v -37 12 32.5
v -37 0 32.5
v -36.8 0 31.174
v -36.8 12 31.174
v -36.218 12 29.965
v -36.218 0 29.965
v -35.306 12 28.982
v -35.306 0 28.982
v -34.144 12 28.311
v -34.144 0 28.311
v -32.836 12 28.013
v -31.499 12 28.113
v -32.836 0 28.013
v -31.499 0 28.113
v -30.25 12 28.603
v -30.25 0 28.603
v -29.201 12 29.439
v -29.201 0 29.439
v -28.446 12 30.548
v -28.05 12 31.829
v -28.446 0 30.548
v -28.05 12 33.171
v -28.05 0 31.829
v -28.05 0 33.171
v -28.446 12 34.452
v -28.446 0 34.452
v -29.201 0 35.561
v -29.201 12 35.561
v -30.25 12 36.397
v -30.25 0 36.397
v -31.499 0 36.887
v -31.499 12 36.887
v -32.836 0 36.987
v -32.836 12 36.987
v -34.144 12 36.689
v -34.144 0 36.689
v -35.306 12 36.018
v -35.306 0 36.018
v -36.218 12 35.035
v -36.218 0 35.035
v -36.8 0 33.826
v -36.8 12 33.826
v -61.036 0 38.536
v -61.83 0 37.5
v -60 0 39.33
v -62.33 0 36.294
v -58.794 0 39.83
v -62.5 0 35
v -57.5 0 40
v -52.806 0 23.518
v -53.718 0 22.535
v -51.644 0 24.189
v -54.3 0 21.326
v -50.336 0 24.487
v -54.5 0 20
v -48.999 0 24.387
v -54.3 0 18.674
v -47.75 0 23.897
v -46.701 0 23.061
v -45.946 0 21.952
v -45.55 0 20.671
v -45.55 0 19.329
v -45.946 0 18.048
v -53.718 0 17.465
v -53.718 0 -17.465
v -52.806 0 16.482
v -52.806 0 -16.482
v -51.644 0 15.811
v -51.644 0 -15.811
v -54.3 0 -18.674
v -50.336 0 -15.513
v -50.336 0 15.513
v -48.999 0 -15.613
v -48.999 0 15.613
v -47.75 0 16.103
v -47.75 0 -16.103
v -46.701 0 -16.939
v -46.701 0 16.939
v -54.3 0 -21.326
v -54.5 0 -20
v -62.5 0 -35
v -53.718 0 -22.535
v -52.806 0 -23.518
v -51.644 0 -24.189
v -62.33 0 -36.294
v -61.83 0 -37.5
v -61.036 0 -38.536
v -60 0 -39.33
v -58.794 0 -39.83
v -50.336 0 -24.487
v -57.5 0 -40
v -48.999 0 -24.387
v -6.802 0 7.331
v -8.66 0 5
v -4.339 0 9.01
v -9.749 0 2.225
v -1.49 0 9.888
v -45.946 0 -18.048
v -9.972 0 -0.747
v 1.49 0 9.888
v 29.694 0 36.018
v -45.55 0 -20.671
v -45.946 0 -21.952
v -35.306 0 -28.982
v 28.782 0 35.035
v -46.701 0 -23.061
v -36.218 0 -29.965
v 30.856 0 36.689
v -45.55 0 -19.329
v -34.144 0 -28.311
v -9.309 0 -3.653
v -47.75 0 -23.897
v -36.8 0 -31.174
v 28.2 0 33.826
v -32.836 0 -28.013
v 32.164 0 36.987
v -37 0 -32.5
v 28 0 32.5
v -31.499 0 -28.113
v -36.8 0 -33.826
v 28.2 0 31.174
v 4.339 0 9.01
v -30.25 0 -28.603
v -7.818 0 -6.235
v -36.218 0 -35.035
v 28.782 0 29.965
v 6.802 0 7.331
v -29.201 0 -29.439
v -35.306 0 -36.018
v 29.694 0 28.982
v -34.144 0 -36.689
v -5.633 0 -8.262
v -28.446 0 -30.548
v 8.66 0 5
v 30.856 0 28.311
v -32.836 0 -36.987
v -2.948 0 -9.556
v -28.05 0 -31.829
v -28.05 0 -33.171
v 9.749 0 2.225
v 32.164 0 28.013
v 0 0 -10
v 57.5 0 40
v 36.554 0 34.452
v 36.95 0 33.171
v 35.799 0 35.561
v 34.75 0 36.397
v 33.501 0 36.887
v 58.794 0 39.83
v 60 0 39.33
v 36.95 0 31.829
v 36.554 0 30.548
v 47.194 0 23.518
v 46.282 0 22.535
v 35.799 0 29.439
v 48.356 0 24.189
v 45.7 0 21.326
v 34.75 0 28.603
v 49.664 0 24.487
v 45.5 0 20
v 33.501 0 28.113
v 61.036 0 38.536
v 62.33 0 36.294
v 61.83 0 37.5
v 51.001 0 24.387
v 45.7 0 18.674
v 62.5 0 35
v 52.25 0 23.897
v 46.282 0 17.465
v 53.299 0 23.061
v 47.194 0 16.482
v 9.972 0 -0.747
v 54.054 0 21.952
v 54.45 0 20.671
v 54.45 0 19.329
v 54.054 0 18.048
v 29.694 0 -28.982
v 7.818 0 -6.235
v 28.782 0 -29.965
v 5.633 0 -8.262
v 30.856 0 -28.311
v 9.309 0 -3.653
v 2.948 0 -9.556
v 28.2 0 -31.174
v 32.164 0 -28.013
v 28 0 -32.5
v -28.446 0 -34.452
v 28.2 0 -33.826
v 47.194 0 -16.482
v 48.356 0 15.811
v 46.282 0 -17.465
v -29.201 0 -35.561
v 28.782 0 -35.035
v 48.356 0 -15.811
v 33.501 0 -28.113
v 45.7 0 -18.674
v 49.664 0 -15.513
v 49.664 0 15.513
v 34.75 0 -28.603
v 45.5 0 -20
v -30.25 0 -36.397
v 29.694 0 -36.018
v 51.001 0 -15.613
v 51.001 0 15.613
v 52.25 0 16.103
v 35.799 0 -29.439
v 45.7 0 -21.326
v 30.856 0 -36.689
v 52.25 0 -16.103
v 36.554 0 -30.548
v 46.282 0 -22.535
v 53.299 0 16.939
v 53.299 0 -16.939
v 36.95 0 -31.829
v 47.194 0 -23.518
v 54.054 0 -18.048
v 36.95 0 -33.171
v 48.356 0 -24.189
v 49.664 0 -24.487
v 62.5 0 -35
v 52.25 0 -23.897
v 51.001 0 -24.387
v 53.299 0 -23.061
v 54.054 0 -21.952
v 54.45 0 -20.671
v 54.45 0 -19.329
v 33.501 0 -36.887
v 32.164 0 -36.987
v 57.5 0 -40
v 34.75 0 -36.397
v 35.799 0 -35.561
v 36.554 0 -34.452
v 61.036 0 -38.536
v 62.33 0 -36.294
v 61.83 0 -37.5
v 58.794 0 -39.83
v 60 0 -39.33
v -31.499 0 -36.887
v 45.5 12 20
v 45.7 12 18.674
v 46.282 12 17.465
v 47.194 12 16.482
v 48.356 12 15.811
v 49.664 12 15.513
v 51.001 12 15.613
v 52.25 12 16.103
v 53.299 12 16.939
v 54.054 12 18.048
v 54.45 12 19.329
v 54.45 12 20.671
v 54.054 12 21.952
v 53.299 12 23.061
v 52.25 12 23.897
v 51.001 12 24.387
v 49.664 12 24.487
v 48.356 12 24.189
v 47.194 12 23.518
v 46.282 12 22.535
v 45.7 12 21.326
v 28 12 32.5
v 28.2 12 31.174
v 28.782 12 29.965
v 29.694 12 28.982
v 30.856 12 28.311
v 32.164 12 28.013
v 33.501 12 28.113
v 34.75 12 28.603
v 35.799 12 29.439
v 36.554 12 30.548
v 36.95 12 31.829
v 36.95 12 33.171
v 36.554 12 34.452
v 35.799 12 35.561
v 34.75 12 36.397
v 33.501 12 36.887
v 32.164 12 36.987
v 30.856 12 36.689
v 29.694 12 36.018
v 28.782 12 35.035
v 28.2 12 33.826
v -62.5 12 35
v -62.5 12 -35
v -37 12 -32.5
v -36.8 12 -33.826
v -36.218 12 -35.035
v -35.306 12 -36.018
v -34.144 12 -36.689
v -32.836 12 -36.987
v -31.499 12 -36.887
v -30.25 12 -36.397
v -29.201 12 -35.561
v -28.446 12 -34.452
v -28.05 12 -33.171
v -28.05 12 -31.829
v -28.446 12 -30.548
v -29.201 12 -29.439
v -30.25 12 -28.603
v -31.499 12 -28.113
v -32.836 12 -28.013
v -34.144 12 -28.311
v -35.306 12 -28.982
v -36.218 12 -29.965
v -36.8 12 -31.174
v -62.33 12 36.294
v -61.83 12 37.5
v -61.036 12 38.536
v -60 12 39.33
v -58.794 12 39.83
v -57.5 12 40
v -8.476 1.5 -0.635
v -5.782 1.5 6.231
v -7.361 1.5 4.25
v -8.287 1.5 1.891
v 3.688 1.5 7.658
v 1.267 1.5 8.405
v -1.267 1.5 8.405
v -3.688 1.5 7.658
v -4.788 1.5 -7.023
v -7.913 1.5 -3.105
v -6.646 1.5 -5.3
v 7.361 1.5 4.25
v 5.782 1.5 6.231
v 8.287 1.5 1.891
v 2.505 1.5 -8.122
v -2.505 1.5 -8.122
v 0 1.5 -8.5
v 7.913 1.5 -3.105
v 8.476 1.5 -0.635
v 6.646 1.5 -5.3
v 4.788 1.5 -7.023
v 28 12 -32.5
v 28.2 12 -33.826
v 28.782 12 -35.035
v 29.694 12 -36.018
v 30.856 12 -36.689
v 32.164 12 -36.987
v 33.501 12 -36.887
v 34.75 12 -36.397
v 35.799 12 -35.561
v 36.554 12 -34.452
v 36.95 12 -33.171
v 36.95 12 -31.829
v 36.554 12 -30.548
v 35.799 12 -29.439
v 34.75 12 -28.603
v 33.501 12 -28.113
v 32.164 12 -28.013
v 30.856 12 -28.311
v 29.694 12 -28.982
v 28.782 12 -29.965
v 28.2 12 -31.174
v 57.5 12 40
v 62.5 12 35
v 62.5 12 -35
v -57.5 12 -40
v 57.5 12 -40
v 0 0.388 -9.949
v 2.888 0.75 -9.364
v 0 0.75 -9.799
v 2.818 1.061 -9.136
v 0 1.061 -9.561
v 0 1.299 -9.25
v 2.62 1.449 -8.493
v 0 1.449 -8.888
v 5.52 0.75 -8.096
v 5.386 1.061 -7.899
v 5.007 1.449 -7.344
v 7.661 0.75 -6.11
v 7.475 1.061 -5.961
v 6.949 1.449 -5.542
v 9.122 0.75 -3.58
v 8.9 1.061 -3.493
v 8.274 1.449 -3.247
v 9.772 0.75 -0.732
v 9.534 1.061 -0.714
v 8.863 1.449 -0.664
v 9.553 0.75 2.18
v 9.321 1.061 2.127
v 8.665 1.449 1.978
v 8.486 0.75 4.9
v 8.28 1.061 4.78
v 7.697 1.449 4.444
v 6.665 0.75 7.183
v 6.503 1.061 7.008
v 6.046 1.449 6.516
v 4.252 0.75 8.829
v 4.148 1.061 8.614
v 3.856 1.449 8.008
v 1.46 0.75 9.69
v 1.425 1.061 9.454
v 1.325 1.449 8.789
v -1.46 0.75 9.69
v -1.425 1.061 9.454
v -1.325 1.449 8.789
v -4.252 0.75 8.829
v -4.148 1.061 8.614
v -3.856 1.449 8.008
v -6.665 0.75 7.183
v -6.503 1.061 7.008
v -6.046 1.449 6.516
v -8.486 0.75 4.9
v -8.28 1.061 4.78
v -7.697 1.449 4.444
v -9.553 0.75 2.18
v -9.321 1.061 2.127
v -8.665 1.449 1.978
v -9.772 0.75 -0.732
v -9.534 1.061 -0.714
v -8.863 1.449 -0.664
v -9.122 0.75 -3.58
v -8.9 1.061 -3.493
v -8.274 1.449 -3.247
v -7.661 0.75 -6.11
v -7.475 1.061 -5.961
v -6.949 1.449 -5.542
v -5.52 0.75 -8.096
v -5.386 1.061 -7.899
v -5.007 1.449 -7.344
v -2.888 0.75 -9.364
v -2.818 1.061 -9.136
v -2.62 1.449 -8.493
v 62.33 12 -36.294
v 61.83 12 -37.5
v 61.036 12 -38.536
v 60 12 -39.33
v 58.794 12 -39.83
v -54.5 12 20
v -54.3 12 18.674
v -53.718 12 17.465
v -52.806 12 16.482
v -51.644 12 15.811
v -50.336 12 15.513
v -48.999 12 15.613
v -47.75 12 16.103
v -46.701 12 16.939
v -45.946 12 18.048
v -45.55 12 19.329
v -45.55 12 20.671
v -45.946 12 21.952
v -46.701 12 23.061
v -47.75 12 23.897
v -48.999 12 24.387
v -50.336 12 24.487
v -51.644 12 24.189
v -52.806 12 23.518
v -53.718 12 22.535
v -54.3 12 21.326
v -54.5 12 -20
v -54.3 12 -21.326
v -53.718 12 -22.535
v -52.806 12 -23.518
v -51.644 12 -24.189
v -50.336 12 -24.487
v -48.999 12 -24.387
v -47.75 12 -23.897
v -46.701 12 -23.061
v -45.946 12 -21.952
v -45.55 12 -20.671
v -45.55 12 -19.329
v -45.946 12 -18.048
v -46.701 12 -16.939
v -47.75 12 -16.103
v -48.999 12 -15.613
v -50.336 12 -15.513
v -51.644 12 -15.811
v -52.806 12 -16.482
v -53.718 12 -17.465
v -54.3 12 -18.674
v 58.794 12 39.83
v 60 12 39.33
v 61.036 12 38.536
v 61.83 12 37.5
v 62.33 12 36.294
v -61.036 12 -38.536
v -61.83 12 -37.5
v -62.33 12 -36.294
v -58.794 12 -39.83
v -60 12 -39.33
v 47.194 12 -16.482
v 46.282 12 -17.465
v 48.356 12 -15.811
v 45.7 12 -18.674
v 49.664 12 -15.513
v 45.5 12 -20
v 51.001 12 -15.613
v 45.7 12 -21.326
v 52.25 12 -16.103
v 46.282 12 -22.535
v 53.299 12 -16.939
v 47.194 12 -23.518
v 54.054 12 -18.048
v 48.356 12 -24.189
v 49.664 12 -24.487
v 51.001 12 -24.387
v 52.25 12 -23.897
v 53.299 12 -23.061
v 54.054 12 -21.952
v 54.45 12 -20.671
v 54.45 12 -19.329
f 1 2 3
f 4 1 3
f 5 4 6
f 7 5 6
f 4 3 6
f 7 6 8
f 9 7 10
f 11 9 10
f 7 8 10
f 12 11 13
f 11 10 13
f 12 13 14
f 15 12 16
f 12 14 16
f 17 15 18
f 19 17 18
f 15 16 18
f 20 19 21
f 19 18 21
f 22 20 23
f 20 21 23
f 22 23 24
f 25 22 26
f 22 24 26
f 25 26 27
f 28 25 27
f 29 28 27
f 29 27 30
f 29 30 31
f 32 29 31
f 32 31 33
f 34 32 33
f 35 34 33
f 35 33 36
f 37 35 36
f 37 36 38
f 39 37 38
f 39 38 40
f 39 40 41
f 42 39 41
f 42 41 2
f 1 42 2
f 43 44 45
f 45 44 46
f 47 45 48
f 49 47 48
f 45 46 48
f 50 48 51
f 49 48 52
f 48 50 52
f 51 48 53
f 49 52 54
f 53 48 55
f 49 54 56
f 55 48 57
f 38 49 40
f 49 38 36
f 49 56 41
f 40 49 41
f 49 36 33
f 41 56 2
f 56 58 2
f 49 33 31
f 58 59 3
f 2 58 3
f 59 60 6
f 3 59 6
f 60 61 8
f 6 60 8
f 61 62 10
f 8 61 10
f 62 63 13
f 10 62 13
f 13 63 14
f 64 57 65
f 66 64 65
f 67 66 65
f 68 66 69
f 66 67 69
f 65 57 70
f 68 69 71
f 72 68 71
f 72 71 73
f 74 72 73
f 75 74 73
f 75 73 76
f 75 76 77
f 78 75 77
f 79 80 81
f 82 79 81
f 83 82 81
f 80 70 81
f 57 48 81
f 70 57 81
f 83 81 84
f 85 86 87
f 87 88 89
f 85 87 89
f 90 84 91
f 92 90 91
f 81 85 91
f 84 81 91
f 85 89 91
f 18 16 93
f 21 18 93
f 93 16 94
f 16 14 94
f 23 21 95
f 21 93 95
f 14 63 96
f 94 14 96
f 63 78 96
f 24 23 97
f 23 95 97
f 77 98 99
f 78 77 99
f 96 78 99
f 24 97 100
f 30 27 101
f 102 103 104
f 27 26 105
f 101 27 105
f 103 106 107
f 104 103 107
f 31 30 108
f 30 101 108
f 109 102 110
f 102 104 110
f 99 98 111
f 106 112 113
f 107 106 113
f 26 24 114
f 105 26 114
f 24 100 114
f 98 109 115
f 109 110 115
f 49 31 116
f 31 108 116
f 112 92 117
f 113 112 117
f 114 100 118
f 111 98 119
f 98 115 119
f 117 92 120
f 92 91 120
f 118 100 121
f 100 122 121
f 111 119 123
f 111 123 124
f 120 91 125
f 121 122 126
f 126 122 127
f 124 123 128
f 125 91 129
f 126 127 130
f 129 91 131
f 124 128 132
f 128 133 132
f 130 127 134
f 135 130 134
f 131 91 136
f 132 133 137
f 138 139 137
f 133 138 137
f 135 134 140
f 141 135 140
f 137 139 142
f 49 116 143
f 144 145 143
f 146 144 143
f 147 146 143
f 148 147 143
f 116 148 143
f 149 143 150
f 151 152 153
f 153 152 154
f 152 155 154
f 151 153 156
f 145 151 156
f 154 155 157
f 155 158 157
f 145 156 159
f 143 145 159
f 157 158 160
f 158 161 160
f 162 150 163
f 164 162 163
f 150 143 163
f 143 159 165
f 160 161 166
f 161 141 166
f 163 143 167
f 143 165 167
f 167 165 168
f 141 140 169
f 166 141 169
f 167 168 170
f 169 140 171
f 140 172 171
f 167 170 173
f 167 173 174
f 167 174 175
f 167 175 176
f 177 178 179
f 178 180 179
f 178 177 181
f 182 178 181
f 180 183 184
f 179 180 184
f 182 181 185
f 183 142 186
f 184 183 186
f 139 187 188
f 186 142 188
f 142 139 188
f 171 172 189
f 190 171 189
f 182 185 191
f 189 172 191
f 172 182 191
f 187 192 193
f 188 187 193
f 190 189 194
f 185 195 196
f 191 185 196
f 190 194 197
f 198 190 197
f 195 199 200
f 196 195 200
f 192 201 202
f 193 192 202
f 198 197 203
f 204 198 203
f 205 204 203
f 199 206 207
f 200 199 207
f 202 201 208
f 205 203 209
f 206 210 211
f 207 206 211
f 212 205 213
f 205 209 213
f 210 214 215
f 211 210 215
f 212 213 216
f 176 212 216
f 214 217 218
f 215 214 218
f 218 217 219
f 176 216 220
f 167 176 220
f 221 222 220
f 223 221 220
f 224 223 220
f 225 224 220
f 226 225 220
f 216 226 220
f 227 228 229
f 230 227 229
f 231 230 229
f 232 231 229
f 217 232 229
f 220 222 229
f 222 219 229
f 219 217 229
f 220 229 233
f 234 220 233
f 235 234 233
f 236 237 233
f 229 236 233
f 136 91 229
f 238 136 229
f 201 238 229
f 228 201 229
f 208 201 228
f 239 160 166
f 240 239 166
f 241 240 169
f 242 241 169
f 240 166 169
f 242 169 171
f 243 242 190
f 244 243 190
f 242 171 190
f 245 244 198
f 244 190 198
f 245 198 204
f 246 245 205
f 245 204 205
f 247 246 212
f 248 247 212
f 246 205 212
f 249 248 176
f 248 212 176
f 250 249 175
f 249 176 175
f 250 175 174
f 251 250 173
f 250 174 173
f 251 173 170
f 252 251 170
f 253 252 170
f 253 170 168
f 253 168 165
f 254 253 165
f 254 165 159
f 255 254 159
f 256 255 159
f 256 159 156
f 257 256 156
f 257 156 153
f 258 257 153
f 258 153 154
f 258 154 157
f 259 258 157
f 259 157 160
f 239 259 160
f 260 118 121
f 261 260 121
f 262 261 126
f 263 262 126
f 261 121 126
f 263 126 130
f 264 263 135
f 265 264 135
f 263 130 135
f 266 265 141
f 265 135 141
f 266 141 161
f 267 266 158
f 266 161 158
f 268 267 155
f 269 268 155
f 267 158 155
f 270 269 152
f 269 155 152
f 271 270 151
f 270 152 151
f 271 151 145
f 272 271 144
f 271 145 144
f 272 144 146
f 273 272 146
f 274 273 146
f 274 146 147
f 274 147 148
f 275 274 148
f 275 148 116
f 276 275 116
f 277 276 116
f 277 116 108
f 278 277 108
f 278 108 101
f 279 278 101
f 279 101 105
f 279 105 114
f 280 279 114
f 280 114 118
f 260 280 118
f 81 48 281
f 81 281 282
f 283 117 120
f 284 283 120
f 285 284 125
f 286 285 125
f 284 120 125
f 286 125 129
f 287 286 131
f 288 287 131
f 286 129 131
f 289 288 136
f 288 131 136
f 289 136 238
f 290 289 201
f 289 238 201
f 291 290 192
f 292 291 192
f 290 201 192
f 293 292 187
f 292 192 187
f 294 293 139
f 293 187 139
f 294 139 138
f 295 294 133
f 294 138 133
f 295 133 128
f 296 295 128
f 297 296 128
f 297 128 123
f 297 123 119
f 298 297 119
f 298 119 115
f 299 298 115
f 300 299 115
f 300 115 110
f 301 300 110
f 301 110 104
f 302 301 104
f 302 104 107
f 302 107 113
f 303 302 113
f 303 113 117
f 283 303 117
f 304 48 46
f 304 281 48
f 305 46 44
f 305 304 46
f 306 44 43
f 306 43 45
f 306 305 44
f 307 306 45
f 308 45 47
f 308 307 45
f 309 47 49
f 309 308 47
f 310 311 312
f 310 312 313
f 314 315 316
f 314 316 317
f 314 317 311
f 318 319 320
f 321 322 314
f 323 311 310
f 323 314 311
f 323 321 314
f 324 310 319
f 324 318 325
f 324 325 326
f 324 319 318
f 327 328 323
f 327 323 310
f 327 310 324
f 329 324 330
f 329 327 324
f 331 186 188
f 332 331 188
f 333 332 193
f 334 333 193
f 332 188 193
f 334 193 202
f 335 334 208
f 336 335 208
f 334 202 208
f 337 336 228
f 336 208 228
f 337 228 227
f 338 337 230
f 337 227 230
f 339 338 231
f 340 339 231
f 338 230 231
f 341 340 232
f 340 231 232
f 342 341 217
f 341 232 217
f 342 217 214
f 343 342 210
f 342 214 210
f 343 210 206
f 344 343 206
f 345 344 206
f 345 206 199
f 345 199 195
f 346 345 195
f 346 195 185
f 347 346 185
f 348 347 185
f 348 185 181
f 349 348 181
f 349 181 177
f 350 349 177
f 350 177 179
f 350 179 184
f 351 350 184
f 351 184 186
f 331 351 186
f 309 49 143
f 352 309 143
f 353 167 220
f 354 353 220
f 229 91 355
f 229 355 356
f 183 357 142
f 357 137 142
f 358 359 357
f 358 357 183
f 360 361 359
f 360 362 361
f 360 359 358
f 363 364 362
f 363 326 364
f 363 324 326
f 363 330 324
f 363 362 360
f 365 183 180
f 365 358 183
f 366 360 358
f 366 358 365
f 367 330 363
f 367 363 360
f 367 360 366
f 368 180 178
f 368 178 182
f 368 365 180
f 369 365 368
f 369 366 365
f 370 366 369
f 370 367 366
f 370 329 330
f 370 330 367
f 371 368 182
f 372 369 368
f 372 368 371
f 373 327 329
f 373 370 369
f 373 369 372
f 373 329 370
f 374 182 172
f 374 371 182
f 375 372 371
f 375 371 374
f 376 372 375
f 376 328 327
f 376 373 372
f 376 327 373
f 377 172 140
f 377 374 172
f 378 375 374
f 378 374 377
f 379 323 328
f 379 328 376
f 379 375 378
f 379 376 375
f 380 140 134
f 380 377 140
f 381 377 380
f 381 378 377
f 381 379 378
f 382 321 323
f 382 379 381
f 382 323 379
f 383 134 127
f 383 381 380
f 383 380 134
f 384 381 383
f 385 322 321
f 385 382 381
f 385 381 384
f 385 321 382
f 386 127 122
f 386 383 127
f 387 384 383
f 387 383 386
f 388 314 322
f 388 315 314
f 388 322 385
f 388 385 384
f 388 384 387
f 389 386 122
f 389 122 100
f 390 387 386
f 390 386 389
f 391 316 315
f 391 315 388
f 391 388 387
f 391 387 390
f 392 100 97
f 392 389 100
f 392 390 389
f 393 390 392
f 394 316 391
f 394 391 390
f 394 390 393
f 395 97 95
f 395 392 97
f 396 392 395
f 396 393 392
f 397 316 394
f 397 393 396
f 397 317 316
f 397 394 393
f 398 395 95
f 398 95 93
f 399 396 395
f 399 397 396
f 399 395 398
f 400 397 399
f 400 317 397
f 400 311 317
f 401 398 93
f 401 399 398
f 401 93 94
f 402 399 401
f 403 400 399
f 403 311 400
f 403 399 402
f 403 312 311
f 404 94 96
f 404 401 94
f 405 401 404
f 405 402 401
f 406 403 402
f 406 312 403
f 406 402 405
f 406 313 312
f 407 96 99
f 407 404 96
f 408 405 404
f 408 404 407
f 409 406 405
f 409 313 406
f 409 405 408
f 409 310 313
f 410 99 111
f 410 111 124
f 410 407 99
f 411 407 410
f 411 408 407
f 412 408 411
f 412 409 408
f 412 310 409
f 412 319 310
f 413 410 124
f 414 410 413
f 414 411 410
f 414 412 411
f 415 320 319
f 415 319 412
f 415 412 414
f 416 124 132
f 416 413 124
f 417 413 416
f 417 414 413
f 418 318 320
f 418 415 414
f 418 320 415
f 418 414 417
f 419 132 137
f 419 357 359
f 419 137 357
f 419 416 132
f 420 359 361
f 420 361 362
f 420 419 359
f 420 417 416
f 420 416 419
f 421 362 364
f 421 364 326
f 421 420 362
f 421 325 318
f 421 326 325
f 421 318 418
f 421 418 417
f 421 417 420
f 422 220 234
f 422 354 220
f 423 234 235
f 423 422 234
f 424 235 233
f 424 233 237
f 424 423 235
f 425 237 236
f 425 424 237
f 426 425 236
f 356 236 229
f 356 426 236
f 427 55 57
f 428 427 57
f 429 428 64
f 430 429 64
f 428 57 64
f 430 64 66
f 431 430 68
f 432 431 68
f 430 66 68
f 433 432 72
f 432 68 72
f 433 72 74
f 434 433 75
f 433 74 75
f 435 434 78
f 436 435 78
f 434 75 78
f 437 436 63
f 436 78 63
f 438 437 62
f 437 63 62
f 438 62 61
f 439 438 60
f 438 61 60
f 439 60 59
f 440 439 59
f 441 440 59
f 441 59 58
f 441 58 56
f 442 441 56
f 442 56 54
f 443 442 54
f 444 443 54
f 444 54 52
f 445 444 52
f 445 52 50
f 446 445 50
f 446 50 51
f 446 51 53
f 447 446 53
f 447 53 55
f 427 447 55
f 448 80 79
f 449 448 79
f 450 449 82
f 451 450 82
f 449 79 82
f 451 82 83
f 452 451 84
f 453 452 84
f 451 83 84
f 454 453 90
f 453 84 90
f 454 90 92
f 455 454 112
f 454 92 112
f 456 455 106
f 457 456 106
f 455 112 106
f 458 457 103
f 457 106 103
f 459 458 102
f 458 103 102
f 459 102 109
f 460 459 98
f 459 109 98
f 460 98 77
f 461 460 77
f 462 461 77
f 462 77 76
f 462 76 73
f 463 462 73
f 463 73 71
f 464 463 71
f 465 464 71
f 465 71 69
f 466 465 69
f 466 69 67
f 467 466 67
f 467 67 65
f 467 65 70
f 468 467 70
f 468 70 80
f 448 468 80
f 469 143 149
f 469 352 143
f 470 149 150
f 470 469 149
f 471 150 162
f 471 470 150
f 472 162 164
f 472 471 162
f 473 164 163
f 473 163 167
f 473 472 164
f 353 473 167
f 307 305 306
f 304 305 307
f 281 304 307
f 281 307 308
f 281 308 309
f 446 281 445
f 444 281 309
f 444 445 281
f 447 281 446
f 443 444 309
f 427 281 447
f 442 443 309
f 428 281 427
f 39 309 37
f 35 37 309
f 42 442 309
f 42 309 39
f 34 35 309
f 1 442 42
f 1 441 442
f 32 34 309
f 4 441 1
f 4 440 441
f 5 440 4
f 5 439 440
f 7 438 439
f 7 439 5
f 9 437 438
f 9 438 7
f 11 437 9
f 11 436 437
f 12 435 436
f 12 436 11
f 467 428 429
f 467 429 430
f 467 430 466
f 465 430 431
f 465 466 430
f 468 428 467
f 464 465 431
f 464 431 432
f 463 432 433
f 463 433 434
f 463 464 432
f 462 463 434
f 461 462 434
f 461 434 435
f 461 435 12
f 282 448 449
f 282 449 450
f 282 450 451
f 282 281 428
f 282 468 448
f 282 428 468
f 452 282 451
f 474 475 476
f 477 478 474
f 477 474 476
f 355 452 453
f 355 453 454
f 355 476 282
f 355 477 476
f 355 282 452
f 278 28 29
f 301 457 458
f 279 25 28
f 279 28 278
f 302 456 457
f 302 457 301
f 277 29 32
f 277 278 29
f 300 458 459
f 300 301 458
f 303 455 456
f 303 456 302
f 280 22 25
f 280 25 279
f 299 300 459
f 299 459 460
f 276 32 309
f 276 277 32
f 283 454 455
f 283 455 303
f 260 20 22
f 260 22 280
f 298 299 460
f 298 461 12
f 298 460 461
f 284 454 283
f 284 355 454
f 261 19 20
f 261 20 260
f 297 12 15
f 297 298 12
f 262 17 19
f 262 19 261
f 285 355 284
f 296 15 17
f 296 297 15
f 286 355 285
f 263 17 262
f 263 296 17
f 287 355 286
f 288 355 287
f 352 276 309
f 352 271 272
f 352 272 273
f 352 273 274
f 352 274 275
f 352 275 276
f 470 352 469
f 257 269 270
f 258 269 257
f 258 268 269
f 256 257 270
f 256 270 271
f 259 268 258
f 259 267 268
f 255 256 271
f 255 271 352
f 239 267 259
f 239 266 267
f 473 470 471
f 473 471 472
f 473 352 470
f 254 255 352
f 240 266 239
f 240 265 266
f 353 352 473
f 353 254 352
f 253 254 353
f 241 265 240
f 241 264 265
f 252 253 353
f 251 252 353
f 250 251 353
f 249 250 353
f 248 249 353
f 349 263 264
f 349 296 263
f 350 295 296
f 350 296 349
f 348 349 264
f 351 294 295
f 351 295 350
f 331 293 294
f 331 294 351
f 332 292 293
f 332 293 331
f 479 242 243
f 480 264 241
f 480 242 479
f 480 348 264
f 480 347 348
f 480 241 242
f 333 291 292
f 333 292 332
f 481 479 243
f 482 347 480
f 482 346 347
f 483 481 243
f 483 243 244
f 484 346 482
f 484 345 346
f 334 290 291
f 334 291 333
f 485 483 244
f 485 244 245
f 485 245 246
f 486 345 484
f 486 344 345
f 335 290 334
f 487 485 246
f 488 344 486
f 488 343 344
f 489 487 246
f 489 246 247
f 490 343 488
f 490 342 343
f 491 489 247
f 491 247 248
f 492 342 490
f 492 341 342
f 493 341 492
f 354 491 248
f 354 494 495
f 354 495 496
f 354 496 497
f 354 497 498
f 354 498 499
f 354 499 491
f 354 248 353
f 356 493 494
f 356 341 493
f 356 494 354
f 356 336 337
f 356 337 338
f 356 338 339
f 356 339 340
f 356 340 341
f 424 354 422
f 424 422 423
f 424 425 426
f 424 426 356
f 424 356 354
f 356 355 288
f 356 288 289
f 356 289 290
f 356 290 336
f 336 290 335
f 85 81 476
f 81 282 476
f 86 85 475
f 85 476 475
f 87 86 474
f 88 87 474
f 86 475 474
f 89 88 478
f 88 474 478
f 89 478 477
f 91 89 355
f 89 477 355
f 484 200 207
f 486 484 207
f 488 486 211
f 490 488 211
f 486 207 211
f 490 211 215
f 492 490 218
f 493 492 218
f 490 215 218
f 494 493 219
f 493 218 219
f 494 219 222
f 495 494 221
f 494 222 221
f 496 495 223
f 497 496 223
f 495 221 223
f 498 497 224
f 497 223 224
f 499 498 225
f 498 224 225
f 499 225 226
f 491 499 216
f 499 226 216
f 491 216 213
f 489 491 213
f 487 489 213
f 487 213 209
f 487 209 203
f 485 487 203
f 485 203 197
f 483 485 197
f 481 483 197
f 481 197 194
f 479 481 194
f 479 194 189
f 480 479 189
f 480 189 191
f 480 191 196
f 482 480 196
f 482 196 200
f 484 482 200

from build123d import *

# Parameters (mm, degrees)
SZKIC1_W                    = 125
SZKIC1_H                    = 80
DODANIE_WYCI_GNI_CIE1_DEPTH = 12
ZAOKR_GLENIE1_R             = 5
OTW_R_POD_RUB_M81_D         = 9
OTW_R_POD_RUB_M81_DEPTH     = 16
OTW_R_POD_RUB_M81_TIP       = 2.703872786
OTW_R_POD_RUB_M82_D         = 9
OTW_R_POD_RUB_M82_DEPTH     = 16
OTW_R_POD_RUB_M82_TIP       = 2.703872786
SZKIC8_R                    = 10
WYTNIJ_WYCI_GNI_CIE1_DEPTH  = 1.5
ZAOKR_GLENIE2_R             = 1.5


with BuildPart() as part:
    # Szkic1 → Dodanie-wyciągnięcie1 (new body)
    with BuildSketch(Plane(origin=(0, 0, 0), x_dir=(1, 0, 0), z_dir=(0, 1, 0))):
        Rectangle(SZKIC1_W, SZKIC1_H)
    extrude(amount=DODANIE_WYCI_GNI_CIE1_DEPTH)

    # Zaokrąglenie1
    zaokr_glenie1_edges = [part.edges().sort_by_distance(p)[0] for p in [
        (62.5, 6, 40),
        (-62.5, 6, 40),
        (-62.5, 6, -40),
        (62.5, 6, -40),
    ]]
    fillet(zaokr_glenie1_edges, radius=ZAOKR_GLENIE1_R)

    # Otwór pod śrubę M81
    with Locations(Plane(origin=(0, 12, 0), x_dir=(1, 0, 0), z_dir=(0, 1, 0))):
        with Locations((-50, 20), (50, 20), (50, -20), (-50, -20)):
            Hole(OTW_R_POD_RUB_M81_D / 2, depth=OTW_R_POD_RUB_M81_DEPTH)
            with Locations((0, 0, -(OTW_R_POD_RUB_M81_DEPTH + OTW_R_POD_RUB_M81_TIP / 2))):  # 118° drill point
                Cone(0, OTW_R_POD_RUB_M81_D / 2, OTW_R_POD_RUB_M81_TIP, mode=Mode.SUBTRACT)

    # Otwór pod śrubę M82
    with Locations(Plane(origin=(0, 12, 0), x_dir=(1, 0, 0), z_dir=(0, 1, 0))):
        with Locations((-32.5, 32.5), (32.5, 32.5), (32.5, -32.5), (-32.5, -32.5)):
            Hole(OTW_R_POD_RUB_M82_D / 2, depth=OTW_R_POD_RUB_M82_DEPTH)
            with Locations((0, 0, -(OTW_R_POD_RUB_M82_DEPTH + OTW_R_POD_RUB_M82_TIP / 2))):  # 118° drill point
                Cone(0, OTW_R_POD_RUB_M82_D / 2, OTW_R_POD_RUB_M82_TIP, mode=Mode.SUBTRACT)

    # Szkic8 → Wytnij-wyciągnięcie1 (cut)
    with BuildSketch(Plane.XZ):
        with Locations(Location((0, 0, 0), (0, 0, 270))):
            Circle(SZKIC8_R)
    extrude(amount=-WYTNIJ_WYCI_GNI_CIE1_DEPTH, mode=Mode.SUBTRACT)

    # Zaokrąglenie2
    zaokr_glenie2_edges = [part.edges().sort_by_distance(p)[0] for p in [
        (0, 1.5, 10),
    ]]
    fillet(zaokr_glenie2_edges, radius=ZAOKR_GLENIE2_R - 0.0001)  # a hair under: the kernel refuses the full size


solid = part.part
